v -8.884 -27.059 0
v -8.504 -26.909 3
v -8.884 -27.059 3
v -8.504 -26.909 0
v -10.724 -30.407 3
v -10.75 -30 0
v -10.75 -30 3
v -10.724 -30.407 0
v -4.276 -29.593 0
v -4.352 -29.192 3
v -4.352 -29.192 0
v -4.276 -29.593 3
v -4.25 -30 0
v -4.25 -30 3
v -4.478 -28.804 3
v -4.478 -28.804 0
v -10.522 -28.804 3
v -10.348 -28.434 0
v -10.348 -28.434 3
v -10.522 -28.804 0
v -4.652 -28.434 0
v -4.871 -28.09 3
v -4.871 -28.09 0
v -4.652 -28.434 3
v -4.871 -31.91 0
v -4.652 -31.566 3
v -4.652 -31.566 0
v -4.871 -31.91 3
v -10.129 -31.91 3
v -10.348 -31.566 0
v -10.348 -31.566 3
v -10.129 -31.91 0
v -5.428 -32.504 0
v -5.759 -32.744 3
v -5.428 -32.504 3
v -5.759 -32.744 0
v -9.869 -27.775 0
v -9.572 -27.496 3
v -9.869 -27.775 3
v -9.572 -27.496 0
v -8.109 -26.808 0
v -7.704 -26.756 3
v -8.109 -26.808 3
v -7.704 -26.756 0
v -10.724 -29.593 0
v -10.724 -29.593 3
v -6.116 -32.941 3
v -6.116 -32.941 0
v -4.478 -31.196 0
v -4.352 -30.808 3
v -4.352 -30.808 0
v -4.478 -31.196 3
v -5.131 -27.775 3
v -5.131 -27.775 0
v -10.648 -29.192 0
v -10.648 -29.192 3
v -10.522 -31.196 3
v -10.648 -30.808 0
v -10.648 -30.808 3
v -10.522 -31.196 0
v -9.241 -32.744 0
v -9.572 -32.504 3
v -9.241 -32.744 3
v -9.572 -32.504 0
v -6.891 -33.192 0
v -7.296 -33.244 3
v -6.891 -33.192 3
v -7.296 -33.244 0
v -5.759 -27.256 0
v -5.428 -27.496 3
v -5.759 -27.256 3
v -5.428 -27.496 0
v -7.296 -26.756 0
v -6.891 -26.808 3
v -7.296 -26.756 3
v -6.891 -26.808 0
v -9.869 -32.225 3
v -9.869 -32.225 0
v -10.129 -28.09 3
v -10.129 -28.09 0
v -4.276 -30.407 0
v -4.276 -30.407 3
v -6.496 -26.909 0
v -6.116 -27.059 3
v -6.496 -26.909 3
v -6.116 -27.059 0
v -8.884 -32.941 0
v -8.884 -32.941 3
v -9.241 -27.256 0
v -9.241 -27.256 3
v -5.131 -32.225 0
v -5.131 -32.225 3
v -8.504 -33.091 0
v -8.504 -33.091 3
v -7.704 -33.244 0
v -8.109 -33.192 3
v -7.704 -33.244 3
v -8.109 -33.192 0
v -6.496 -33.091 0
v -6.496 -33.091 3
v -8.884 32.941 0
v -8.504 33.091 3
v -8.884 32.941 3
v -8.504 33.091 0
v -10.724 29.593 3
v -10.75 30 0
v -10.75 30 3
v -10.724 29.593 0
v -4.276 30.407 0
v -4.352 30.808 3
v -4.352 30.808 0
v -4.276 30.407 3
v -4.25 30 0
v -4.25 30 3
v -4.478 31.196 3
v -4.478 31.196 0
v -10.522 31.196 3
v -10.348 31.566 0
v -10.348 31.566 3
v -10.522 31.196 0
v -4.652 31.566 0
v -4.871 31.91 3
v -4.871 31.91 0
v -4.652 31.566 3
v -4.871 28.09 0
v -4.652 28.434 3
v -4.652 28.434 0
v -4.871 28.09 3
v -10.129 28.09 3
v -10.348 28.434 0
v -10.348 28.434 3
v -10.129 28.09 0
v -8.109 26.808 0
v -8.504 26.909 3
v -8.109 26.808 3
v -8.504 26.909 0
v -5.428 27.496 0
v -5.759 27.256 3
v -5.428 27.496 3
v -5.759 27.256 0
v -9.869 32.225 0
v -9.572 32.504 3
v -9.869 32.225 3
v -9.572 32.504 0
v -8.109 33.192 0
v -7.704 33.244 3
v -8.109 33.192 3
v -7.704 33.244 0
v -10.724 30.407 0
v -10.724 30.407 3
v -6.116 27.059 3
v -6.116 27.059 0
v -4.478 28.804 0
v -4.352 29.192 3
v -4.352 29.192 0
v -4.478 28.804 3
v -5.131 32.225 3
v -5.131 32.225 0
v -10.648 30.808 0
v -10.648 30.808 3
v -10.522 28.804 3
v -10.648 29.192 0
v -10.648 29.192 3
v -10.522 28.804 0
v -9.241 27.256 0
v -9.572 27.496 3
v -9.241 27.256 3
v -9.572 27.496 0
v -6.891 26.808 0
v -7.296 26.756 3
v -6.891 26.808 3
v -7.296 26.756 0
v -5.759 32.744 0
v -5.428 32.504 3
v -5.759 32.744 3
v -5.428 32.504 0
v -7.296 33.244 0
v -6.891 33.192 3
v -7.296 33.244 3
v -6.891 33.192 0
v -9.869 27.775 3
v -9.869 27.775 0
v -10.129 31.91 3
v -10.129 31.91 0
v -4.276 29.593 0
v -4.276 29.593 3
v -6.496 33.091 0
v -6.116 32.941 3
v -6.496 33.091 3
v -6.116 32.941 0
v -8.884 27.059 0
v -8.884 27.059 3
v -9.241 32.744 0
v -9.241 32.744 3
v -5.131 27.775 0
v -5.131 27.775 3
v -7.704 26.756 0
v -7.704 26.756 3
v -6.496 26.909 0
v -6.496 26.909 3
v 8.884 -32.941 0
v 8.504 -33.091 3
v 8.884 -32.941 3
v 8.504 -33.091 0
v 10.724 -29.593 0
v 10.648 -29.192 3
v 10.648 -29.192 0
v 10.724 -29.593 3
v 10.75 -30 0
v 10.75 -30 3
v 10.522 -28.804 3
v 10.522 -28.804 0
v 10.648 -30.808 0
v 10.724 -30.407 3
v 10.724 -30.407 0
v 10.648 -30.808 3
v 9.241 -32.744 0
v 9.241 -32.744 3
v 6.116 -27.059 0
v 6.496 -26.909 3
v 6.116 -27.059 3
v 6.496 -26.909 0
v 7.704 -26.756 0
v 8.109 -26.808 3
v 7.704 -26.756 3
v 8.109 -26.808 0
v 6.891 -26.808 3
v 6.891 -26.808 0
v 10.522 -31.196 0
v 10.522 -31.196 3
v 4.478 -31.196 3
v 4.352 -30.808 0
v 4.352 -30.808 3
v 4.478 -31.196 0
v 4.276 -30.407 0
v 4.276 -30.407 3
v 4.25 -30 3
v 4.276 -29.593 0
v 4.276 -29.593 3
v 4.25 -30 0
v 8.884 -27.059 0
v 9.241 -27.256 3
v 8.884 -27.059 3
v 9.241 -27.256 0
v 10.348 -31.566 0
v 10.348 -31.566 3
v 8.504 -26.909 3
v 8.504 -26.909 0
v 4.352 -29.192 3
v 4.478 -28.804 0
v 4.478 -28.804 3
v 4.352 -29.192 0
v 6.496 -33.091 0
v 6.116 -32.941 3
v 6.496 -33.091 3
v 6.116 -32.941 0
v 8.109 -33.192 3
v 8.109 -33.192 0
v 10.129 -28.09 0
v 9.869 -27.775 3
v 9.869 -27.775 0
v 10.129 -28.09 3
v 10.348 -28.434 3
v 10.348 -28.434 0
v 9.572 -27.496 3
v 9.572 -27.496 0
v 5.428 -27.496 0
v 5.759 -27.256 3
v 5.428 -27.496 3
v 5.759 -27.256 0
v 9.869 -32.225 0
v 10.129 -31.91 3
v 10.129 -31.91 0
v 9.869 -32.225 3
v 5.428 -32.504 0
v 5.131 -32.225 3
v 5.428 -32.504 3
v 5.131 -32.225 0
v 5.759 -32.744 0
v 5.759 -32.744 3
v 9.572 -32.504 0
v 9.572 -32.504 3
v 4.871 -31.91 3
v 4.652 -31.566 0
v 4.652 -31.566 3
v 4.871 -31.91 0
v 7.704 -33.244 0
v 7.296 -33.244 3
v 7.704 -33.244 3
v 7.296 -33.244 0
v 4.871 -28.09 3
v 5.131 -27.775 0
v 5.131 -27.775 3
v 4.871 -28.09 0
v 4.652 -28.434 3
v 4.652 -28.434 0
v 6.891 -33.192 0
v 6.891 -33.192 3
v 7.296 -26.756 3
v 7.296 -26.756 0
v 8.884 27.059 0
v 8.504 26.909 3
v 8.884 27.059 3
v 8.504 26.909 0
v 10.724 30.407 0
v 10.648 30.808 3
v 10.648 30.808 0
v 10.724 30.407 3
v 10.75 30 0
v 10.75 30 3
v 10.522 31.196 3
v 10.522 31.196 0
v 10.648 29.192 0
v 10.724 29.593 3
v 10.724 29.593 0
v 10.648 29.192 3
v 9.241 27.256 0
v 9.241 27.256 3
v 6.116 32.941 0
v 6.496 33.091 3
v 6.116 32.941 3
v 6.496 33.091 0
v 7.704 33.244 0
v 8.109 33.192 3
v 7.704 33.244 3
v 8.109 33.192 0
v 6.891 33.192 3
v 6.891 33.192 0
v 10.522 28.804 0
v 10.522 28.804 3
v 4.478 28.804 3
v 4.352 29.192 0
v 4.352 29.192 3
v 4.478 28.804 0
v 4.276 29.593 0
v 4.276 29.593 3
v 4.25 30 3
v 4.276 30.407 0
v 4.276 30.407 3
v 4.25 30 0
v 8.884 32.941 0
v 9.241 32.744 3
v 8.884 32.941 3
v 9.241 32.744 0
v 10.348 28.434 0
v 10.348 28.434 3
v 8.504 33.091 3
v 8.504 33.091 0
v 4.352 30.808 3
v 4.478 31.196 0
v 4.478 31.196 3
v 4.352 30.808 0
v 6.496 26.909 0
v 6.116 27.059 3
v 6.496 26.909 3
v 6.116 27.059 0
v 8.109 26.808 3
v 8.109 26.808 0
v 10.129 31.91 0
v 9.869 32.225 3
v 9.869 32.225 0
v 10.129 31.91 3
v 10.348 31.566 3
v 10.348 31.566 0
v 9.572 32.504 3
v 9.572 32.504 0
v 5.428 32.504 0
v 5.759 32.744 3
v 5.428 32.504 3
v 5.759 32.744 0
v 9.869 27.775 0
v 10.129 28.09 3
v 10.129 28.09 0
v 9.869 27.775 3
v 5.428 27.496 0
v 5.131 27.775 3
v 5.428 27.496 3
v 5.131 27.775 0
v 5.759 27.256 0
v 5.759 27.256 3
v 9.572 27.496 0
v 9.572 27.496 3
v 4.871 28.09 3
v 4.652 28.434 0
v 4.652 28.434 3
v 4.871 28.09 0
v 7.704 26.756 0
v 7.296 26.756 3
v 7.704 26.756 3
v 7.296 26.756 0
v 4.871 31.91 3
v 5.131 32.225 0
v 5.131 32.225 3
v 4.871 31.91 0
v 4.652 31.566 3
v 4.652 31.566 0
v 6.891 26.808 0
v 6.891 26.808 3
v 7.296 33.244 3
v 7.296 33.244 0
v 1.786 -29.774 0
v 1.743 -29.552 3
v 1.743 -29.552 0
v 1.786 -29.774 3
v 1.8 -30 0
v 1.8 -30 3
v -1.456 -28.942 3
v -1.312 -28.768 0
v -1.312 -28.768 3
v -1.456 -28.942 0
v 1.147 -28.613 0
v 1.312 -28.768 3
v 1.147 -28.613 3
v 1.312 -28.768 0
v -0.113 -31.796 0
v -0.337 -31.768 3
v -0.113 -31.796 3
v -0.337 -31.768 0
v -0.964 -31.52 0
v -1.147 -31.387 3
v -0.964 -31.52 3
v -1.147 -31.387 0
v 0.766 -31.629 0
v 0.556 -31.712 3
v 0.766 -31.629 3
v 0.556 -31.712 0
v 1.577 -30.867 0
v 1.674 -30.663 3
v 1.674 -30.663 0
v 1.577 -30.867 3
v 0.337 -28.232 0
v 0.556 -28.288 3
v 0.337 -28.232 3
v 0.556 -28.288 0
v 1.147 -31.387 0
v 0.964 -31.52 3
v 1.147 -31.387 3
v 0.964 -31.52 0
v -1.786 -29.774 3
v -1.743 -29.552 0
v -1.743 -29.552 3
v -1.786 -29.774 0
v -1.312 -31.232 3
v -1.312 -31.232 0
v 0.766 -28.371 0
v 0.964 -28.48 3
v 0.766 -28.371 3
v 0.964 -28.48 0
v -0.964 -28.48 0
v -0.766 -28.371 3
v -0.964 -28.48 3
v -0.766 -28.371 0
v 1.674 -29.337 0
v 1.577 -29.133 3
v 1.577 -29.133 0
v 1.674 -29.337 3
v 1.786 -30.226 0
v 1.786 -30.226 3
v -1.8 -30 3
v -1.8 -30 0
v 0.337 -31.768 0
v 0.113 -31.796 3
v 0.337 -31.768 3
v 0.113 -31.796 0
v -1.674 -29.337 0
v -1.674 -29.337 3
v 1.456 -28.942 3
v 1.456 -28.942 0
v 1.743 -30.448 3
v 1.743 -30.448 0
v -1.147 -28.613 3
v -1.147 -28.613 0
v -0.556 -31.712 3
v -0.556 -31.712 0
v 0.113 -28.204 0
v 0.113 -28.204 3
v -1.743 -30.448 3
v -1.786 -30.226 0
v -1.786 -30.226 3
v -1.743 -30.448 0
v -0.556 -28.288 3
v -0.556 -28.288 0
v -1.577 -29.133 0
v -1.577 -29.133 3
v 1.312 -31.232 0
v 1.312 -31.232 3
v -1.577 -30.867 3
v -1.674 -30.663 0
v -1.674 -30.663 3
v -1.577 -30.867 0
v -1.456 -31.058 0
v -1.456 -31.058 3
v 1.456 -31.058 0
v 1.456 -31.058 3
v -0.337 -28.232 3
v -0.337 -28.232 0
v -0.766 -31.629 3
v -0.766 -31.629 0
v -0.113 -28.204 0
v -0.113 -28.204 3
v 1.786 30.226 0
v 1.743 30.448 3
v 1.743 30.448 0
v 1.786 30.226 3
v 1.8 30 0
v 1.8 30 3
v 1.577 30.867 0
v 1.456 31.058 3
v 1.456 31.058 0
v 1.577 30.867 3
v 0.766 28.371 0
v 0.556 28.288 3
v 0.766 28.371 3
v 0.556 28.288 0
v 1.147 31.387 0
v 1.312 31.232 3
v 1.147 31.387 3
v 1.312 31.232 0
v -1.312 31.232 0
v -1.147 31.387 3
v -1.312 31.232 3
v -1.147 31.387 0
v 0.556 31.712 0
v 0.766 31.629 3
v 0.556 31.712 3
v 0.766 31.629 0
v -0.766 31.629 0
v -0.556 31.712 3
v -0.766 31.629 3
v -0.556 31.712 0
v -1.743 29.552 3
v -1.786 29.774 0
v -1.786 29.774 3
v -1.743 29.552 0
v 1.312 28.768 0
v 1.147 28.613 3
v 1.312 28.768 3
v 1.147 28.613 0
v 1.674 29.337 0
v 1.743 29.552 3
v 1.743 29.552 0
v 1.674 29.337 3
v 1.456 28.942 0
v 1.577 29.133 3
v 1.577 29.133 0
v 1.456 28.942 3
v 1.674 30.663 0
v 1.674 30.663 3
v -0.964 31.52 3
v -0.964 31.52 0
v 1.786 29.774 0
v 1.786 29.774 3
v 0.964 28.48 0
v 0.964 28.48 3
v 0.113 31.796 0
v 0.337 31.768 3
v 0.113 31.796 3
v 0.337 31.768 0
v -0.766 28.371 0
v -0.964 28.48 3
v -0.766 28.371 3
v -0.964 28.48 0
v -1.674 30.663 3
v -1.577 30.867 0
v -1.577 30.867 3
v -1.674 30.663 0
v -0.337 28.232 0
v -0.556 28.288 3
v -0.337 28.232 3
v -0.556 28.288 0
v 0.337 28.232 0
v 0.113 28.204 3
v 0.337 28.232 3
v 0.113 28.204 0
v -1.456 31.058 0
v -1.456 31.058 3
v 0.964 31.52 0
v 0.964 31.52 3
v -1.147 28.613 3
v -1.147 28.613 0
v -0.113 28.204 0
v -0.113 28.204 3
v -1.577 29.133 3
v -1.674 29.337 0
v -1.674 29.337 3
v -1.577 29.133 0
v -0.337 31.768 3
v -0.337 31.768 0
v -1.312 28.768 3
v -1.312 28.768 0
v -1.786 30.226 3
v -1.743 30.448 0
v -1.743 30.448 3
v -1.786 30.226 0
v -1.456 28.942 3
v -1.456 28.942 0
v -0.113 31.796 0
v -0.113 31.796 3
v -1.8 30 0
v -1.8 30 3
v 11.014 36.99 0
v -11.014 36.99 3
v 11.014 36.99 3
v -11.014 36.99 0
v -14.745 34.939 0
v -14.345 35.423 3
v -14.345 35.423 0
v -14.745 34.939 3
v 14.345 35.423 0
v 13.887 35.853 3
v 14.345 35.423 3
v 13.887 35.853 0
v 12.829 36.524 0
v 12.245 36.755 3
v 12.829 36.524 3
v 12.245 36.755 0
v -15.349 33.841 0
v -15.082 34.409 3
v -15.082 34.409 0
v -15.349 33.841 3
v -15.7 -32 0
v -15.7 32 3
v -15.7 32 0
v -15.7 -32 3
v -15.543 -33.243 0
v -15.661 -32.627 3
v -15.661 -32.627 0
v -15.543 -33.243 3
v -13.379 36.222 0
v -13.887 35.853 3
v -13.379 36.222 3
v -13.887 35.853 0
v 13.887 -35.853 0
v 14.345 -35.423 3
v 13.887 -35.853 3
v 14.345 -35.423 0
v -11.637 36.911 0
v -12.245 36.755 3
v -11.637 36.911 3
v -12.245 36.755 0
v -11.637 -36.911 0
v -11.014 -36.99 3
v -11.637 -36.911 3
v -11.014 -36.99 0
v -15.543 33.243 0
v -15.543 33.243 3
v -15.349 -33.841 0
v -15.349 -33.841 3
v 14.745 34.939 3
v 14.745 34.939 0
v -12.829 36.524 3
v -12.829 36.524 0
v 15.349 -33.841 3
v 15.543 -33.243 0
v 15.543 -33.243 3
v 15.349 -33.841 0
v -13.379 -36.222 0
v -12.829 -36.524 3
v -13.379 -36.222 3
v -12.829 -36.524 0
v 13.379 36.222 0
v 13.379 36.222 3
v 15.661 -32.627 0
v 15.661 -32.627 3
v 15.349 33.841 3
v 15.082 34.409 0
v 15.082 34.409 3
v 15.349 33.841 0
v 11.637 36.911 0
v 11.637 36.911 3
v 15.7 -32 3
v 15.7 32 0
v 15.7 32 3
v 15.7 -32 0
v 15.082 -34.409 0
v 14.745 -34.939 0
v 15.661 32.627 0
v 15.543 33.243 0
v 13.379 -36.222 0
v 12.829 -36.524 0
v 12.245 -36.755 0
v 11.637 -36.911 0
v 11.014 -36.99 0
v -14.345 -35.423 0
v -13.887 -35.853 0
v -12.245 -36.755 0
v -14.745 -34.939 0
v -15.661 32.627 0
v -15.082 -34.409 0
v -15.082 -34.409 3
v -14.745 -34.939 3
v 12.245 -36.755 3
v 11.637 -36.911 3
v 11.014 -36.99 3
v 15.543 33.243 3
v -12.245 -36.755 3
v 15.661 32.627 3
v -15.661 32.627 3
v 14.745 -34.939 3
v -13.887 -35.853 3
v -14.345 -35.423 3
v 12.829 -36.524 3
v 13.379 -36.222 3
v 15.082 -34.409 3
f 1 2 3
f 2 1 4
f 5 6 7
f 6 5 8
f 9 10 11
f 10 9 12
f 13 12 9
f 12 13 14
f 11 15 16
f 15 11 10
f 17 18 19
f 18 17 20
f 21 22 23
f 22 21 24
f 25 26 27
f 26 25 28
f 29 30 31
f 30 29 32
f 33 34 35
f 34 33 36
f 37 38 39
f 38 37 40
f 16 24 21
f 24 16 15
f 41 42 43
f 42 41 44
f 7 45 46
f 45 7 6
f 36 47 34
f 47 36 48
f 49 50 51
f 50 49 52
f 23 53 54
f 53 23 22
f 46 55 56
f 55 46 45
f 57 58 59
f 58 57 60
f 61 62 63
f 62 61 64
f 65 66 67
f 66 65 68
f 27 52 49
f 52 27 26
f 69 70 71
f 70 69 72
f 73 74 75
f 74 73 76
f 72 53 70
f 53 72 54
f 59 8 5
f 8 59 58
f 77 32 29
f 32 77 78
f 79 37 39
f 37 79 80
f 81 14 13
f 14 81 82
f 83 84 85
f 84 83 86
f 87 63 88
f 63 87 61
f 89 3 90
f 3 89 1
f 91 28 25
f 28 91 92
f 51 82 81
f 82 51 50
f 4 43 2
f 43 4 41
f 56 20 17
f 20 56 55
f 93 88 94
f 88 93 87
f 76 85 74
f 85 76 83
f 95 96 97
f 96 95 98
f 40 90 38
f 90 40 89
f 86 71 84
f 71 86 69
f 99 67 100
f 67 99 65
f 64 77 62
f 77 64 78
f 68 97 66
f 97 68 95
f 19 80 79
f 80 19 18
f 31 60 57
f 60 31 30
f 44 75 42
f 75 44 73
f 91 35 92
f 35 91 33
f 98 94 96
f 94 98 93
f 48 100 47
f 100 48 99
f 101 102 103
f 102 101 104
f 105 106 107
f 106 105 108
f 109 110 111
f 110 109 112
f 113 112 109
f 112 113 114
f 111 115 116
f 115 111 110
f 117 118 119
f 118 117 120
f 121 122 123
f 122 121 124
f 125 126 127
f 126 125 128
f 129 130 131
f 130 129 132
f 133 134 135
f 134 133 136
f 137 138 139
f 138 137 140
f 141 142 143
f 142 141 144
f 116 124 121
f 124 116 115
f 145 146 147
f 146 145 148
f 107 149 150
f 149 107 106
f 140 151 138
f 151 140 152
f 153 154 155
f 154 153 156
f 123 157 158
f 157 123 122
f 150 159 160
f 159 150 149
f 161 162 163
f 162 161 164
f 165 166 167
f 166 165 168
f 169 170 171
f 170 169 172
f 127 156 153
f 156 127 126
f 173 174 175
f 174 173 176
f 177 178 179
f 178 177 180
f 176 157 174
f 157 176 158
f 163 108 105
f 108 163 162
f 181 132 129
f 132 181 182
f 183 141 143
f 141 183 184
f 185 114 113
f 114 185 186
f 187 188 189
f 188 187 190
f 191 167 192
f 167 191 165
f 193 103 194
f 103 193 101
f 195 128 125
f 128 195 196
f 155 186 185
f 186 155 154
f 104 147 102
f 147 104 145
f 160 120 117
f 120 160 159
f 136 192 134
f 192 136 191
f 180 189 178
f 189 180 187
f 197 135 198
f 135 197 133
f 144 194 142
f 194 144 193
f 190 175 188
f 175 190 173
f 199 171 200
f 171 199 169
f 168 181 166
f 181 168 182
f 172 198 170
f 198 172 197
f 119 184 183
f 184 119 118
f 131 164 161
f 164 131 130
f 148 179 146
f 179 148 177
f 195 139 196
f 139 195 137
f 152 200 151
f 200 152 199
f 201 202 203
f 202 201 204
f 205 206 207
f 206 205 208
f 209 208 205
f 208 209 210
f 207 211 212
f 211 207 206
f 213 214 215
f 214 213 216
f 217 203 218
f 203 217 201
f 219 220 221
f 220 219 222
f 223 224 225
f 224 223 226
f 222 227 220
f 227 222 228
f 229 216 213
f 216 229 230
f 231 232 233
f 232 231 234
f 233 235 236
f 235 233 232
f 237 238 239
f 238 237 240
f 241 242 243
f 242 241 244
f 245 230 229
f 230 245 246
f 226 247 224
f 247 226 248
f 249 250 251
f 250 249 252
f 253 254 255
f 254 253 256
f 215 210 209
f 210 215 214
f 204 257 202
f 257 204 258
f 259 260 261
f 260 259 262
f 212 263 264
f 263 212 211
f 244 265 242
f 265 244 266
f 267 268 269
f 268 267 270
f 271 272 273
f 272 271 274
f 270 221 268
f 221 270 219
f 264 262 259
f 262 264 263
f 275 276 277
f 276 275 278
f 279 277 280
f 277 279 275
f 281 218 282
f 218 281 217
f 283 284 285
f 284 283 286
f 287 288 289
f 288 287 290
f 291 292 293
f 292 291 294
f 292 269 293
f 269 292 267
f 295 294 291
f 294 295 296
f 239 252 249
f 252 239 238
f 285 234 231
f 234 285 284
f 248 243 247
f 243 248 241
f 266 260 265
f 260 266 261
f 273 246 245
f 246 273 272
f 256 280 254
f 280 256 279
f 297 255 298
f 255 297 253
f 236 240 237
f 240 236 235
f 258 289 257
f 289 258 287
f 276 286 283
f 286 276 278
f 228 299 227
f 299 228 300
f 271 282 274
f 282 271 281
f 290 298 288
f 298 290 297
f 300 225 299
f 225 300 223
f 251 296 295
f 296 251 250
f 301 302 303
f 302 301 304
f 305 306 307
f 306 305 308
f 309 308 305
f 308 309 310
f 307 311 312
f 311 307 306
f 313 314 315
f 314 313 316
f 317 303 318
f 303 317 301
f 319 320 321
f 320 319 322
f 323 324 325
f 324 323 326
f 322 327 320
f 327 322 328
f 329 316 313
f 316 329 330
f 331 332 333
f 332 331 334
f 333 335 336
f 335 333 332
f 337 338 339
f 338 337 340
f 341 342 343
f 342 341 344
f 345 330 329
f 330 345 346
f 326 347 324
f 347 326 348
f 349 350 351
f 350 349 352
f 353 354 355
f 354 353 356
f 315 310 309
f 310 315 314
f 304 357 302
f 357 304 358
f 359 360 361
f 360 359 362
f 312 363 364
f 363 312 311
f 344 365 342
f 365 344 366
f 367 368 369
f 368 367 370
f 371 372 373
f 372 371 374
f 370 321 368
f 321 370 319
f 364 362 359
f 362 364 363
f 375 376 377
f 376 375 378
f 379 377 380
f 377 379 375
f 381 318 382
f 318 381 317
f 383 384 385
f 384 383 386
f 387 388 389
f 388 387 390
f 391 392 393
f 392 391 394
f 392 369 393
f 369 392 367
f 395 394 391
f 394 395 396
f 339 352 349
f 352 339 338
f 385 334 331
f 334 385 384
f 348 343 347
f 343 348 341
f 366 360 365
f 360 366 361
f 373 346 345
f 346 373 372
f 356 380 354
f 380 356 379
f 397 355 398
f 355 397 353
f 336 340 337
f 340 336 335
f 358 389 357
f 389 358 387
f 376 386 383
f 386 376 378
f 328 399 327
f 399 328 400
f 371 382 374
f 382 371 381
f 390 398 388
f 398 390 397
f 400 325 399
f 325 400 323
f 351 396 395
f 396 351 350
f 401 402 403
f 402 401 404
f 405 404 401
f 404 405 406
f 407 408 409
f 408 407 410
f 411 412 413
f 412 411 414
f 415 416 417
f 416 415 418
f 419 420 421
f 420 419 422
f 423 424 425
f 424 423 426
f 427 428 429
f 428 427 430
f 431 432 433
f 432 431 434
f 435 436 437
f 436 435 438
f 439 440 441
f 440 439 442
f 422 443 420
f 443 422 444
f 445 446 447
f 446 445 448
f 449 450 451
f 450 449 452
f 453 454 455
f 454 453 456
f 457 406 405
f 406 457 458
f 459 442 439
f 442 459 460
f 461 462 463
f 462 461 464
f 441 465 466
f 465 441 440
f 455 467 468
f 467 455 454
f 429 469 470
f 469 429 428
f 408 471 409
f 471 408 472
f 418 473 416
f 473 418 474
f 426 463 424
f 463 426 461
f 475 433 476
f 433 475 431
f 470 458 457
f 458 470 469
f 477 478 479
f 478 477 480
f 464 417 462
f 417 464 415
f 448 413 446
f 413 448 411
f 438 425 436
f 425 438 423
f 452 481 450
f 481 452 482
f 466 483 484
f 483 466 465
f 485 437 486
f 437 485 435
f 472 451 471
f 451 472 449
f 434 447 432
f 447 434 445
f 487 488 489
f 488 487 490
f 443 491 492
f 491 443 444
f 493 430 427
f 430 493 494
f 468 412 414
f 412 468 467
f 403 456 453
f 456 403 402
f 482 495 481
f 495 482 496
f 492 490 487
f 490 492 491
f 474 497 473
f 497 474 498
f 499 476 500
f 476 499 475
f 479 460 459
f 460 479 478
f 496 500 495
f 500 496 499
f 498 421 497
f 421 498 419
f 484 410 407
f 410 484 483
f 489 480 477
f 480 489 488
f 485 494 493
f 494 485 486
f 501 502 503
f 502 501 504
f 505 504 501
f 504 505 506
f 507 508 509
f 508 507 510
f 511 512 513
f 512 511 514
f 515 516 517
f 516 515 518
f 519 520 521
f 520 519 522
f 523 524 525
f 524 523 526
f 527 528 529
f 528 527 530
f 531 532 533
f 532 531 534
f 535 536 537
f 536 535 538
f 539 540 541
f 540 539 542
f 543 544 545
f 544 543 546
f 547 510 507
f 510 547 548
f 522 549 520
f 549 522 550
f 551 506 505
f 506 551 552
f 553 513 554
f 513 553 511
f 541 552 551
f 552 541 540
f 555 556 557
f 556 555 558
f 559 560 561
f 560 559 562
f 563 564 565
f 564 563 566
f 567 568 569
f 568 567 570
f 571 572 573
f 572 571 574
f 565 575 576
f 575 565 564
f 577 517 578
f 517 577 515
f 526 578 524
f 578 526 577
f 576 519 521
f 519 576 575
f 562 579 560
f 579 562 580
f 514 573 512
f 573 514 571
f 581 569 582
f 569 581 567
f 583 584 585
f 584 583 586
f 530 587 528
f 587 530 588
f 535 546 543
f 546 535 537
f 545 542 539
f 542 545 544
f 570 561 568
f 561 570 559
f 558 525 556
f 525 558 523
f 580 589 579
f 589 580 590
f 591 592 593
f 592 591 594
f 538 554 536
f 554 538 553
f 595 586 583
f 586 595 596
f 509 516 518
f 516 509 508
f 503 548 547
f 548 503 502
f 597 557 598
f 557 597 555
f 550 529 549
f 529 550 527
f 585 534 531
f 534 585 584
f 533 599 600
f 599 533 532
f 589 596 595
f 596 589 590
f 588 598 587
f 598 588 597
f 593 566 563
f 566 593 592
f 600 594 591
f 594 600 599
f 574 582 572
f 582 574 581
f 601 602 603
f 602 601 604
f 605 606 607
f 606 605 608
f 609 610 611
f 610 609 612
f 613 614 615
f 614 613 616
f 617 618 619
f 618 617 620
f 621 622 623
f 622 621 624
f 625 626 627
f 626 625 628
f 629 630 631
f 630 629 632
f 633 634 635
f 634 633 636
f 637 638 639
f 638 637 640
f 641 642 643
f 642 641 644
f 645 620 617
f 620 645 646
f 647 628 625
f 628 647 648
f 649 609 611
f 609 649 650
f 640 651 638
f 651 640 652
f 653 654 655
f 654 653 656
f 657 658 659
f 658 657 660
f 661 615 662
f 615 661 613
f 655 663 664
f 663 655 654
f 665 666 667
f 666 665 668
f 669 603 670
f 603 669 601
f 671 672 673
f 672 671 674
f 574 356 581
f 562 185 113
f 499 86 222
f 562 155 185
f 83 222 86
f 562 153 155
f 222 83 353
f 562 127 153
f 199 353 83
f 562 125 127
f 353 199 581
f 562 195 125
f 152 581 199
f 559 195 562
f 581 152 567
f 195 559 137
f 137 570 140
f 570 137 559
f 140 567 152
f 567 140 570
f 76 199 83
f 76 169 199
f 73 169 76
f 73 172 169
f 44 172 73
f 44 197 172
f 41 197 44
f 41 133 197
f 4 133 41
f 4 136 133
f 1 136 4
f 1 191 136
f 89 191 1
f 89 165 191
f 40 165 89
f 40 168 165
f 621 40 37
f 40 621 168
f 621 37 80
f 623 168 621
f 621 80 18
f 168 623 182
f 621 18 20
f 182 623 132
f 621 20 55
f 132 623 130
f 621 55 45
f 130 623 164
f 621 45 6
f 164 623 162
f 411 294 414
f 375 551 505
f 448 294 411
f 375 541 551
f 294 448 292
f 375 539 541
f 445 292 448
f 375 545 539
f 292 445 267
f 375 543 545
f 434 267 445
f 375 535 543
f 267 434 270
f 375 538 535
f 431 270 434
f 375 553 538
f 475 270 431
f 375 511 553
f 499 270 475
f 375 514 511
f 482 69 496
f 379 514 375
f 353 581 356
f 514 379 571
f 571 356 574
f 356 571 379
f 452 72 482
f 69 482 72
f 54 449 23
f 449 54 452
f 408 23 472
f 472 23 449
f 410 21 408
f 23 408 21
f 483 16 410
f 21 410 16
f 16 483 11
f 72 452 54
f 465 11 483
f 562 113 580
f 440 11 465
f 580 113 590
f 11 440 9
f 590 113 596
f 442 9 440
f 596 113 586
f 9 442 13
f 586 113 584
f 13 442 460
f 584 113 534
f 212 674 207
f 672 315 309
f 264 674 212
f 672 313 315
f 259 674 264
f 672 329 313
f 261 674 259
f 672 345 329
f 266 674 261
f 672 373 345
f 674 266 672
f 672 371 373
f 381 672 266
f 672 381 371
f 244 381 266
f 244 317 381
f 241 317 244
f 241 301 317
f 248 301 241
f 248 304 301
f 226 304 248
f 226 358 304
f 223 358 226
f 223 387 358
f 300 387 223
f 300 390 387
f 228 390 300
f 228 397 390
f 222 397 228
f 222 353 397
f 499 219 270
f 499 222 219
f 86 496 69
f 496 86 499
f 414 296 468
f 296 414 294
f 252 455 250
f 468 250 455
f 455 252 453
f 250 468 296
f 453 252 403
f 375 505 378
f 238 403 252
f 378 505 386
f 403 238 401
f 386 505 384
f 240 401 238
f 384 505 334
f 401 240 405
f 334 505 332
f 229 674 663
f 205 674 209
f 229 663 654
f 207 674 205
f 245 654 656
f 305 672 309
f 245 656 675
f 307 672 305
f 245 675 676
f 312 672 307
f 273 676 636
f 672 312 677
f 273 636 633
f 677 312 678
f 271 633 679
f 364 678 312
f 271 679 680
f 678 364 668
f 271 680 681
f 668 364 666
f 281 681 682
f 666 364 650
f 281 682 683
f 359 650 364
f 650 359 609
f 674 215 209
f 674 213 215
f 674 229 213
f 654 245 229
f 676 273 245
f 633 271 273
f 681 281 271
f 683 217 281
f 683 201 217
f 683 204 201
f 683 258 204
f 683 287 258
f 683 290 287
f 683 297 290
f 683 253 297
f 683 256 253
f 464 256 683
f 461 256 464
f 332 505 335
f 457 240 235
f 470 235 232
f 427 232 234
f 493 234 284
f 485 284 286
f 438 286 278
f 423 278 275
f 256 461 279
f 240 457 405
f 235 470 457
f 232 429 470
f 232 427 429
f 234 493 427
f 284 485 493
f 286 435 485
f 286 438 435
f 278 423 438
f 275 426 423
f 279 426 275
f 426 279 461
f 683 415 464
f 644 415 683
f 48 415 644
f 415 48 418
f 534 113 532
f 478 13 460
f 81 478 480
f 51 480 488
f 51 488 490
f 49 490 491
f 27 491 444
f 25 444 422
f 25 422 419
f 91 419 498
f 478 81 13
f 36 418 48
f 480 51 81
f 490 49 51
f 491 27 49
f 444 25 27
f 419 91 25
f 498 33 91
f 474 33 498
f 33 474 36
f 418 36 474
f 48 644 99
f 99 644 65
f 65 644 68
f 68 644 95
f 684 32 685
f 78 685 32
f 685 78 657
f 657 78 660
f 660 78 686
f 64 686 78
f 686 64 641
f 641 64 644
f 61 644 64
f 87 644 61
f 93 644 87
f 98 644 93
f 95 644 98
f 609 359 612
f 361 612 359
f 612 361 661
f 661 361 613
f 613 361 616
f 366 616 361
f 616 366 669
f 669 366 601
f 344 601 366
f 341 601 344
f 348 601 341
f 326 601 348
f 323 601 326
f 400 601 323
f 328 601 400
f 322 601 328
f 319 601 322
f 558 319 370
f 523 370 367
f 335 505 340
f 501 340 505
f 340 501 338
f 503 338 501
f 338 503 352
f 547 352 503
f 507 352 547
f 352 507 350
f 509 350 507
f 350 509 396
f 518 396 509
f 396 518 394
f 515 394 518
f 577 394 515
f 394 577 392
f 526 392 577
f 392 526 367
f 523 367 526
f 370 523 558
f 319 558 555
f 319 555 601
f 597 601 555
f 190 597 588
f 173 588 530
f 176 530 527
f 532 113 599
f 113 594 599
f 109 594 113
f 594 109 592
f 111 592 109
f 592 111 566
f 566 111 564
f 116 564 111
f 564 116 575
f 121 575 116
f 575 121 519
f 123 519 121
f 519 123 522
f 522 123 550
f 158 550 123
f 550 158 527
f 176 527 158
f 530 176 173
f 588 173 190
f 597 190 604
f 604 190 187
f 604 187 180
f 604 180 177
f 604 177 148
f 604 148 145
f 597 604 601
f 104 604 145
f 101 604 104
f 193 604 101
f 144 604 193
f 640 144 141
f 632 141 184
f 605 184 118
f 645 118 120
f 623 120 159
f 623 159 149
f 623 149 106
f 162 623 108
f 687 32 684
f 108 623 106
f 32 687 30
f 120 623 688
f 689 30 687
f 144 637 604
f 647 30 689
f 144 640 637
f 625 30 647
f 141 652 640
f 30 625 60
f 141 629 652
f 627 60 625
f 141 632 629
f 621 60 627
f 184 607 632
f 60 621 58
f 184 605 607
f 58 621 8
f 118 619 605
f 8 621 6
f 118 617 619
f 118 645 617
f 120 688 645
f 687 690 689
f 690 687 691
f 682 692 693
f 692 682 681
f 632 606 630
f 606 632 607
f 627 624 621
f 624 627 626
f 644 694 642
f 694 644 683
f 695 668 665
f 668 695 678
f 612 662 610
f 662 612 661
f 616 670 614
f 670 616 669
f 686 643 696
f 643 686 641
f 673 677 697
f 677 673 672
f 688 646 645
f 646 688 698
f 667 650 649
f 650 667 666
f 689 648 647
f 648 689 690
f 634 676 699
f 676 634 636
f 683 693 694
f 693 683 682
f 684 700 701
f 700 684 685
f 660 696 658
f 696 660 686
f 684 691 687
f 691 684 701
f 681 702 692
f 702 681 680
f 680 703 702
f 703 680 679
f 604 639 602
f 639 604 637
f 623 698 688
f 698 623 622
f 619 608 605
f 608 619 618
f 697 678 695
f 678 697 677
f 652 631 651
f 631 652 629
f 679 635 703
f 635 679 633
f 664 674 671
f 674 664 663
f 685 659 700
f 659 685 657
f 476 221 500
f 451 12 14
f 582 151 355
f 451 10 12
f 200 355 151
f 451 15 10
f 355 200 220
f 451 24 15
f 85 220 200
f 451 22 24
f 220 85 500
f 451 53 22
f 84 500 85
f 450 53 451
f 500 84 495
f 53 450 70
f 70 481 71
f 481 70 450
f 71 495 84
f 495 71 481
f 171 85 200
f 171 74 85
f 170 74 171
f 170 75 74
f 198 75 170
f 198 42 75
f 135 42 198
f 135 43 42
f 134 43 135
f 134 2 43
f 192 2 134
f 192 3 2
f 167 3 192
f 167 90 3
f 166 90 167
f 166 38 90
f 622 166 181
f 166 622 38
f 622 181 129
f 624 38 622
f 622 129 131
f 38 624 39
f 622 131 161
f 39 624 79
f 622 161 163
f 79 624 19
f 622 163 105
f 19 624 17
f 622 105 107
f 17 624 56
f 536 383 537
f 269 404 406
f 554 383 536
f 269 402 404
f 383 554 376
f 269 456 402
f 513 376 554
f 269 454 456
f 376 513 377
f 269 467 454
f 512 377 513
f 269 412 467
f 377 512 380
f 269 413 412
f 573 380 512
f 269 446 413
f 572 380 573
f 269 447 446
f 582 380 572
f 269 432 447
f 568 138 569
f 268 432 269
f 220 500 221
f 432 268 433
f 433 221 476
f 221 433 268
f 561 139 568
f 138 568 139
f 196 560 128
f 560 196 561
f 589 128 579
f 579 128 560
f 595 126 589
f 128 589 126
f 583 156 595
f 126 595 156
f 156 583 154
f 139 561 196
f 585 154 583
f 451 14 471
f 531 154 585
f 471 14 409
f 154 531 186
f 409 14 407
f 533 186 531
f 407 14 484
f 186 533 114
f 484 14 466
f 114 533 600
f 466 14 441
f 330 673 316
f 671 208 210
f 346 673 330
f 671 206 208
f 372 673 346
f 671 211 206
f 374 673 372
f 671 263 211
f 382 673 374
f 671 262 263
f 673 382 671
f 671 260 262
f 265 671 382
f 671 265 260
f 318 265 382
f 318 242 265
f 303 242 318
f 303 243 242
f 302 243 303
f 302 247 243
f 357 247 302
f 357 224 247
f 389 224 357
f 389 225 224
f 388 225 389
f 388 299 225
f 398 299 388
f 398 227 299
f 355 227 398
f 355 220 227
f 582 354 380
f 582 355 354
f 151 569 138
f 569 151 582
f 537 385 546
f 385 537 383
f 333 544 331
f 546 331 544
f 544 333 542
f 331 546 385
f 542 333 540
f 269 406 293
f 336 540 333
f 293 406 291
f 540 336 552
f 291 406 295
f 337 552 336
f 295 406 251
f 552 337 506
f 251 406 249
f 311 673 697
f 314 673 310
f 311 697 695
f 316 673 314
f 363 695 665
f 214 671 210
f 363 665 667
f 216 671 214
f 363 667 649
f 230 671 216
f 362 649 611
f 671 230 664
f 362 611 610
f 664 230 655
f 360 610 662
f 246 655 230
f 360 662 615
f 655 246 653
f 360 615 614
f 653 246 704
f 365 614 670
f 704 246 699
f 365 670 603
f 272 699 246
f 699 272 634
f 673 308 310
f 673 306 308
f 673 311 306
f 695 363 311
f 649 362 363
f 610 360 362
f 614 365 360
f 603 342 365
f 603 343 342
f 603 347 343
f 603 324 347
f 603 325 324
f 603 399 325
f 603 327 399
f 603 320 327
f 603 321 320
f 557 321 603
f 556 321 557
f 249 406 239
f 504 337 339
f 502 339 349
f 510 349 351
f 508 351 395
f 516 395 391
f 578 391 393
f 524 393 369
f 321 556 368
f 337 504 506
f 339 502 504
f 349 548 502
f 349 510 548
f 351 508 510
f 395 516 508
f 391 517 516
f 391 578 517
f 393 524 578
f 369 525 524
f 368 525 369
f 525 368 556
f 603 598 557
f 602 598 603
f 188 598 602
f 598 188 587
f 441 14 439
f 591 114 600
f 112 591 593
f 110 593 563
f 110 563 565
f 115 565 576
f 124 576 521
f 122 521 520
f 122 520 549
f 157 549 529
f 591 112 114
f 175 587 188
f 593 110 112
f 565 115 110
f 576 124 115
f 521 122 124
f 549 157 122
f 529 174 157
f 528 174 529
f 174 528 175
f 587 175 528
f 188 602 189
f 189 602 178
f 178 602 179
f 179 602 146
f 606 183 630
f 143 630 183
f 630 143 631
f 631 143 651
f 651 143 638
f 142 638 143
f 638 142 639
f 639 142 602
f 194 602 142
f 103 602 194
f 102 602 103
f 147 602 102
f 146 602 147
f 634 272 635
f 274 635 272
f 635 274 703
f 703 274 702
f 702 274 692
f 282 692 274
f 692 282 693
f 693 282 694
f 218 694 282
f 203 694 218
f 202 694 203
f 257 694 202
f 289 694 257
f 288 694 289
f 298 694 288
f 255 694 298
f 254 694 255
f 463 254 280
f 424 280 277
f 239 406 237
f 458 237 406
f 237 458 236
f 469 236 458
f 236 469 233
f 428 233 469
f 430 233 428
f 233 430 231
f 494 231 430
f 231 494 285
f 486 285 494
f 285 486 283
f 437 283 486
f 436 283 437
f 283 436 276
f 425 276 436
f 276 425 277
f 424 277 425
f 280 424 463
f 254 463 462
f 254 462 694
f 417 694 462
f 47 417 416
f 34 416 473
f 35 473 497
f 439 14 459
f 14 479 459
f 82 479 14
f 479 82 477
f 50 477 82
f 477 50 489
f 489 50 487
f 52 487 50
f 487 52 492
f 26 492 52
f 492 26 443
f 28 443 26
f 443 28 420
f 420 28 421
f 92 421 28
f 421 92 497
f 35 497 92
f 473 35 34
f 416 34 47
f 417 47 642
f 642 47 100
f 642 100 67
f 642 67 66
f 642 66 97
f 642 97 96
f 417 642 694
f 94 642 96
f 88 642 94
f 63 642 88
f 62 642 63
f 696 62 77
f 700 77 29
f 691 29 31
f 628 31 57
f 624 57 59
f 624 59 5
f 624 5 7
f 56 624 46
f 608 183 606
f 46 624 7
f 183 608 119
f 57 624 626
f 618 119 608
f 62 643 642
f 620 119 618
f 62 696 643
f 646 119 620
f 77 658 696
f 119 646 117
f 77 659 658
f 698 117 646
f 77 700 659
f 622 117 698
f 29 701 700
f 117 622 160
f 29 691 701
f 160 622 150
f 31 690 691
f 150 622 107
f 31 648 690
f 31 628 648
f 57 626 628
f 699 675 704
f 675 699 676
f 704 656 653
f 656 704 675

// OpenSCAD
$fn = 50;

difference() {
	union() {
		hull() {
			translate(v = [-10.7, 32.0, 0]) {
				cylinder(h = 3, r = 5);
			}
			translate(v = [10.7, 32.0, 0]) {
				cylinder(h = 3, r = 5);
			}
			translate(v = [-10.7, -32.0, 0]) {
				cylinder(h = 3, r = 5);
			}
			translate(v = [10.7, -32.0, 0]) {
				cylinder(h = 3, r = 5);
			}
		}
	}
	union() {
		translate(v = [-7.5, -30.0, -1]) {
			cylinder(h = 5, r = 3.25);
		}
		translate(v = [-7.5, 30.0, -1]) {
			cylinder(h = 5, r = 3.25);
		}
		translate(v = [7.5, -30.0, -1]) {
			cylinder(h = 5, r = 3.25);
		}
		translate(v = [7.5, 30.0, -1]) {
			cylinder(h = 5, r = 3.25);
		}
		translate(v = [0.0, -30.0, -1]) {
			cylinder(h = 5, r = 1.8);
		}
		translate(v = [0.0, 30.0, -1]) {
			cylinder(h = 5, r = 1.8);
		}
	}
}
